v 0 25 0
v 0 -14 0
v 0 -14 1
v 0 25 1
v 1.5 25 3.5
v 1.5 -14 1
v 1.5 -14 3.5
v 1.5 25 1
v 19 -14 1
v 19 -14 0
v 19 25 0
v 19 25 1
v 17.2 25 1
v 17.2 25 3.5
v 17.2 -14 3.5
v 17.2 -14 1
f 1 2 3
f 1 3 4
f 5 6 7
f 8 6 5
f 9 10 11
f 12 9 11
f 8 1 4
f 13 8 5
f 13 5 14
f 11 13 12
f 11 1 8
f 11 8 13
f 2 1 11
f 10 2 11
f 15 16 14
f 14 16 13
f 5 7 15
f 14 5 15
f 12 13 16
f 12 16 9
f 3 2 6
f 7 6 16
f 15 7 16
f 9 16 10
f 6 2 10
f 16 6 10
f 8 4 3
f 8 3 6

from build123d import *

# Parameters (mm, degrees)
BOX004_W     = 15.7
BOX004_H     = 39
BOX004_DEPTH = 3.5
BOX003_W     = 19
BOX003_H     = 39
BOX003_DEPTH = 1


with BuildPart() as cubo004:
    # Box004 → Box004 (new body)
    with BuildSketch(Plane(origin=(1.5, -14, 0), x_dir=(1, 0, 0), z_dir=(0, 0, 1))):
        with Locations((7.85, 19.5)):
            Rectangle(BOX004_W, BOX004_H)
    extrude(amount=BOX004_DEPTH)


with BuildPart() as fusion001:
    # Box003 → Box003 (new body)
    with BuildSketch(Plane(origin=(0, -14, 0), x_dir=(1, 0, 0), z_dir=(0, 0, 1))):
        with Locations((9.5, 19.5)):
            Rectangle(BOX003_W, BOX003_H)
    extrude(amount=BOX003_DEPTH)

    # Fusion001: union Cubo004
    add(cubo004.part)


solid = fusion001.part
